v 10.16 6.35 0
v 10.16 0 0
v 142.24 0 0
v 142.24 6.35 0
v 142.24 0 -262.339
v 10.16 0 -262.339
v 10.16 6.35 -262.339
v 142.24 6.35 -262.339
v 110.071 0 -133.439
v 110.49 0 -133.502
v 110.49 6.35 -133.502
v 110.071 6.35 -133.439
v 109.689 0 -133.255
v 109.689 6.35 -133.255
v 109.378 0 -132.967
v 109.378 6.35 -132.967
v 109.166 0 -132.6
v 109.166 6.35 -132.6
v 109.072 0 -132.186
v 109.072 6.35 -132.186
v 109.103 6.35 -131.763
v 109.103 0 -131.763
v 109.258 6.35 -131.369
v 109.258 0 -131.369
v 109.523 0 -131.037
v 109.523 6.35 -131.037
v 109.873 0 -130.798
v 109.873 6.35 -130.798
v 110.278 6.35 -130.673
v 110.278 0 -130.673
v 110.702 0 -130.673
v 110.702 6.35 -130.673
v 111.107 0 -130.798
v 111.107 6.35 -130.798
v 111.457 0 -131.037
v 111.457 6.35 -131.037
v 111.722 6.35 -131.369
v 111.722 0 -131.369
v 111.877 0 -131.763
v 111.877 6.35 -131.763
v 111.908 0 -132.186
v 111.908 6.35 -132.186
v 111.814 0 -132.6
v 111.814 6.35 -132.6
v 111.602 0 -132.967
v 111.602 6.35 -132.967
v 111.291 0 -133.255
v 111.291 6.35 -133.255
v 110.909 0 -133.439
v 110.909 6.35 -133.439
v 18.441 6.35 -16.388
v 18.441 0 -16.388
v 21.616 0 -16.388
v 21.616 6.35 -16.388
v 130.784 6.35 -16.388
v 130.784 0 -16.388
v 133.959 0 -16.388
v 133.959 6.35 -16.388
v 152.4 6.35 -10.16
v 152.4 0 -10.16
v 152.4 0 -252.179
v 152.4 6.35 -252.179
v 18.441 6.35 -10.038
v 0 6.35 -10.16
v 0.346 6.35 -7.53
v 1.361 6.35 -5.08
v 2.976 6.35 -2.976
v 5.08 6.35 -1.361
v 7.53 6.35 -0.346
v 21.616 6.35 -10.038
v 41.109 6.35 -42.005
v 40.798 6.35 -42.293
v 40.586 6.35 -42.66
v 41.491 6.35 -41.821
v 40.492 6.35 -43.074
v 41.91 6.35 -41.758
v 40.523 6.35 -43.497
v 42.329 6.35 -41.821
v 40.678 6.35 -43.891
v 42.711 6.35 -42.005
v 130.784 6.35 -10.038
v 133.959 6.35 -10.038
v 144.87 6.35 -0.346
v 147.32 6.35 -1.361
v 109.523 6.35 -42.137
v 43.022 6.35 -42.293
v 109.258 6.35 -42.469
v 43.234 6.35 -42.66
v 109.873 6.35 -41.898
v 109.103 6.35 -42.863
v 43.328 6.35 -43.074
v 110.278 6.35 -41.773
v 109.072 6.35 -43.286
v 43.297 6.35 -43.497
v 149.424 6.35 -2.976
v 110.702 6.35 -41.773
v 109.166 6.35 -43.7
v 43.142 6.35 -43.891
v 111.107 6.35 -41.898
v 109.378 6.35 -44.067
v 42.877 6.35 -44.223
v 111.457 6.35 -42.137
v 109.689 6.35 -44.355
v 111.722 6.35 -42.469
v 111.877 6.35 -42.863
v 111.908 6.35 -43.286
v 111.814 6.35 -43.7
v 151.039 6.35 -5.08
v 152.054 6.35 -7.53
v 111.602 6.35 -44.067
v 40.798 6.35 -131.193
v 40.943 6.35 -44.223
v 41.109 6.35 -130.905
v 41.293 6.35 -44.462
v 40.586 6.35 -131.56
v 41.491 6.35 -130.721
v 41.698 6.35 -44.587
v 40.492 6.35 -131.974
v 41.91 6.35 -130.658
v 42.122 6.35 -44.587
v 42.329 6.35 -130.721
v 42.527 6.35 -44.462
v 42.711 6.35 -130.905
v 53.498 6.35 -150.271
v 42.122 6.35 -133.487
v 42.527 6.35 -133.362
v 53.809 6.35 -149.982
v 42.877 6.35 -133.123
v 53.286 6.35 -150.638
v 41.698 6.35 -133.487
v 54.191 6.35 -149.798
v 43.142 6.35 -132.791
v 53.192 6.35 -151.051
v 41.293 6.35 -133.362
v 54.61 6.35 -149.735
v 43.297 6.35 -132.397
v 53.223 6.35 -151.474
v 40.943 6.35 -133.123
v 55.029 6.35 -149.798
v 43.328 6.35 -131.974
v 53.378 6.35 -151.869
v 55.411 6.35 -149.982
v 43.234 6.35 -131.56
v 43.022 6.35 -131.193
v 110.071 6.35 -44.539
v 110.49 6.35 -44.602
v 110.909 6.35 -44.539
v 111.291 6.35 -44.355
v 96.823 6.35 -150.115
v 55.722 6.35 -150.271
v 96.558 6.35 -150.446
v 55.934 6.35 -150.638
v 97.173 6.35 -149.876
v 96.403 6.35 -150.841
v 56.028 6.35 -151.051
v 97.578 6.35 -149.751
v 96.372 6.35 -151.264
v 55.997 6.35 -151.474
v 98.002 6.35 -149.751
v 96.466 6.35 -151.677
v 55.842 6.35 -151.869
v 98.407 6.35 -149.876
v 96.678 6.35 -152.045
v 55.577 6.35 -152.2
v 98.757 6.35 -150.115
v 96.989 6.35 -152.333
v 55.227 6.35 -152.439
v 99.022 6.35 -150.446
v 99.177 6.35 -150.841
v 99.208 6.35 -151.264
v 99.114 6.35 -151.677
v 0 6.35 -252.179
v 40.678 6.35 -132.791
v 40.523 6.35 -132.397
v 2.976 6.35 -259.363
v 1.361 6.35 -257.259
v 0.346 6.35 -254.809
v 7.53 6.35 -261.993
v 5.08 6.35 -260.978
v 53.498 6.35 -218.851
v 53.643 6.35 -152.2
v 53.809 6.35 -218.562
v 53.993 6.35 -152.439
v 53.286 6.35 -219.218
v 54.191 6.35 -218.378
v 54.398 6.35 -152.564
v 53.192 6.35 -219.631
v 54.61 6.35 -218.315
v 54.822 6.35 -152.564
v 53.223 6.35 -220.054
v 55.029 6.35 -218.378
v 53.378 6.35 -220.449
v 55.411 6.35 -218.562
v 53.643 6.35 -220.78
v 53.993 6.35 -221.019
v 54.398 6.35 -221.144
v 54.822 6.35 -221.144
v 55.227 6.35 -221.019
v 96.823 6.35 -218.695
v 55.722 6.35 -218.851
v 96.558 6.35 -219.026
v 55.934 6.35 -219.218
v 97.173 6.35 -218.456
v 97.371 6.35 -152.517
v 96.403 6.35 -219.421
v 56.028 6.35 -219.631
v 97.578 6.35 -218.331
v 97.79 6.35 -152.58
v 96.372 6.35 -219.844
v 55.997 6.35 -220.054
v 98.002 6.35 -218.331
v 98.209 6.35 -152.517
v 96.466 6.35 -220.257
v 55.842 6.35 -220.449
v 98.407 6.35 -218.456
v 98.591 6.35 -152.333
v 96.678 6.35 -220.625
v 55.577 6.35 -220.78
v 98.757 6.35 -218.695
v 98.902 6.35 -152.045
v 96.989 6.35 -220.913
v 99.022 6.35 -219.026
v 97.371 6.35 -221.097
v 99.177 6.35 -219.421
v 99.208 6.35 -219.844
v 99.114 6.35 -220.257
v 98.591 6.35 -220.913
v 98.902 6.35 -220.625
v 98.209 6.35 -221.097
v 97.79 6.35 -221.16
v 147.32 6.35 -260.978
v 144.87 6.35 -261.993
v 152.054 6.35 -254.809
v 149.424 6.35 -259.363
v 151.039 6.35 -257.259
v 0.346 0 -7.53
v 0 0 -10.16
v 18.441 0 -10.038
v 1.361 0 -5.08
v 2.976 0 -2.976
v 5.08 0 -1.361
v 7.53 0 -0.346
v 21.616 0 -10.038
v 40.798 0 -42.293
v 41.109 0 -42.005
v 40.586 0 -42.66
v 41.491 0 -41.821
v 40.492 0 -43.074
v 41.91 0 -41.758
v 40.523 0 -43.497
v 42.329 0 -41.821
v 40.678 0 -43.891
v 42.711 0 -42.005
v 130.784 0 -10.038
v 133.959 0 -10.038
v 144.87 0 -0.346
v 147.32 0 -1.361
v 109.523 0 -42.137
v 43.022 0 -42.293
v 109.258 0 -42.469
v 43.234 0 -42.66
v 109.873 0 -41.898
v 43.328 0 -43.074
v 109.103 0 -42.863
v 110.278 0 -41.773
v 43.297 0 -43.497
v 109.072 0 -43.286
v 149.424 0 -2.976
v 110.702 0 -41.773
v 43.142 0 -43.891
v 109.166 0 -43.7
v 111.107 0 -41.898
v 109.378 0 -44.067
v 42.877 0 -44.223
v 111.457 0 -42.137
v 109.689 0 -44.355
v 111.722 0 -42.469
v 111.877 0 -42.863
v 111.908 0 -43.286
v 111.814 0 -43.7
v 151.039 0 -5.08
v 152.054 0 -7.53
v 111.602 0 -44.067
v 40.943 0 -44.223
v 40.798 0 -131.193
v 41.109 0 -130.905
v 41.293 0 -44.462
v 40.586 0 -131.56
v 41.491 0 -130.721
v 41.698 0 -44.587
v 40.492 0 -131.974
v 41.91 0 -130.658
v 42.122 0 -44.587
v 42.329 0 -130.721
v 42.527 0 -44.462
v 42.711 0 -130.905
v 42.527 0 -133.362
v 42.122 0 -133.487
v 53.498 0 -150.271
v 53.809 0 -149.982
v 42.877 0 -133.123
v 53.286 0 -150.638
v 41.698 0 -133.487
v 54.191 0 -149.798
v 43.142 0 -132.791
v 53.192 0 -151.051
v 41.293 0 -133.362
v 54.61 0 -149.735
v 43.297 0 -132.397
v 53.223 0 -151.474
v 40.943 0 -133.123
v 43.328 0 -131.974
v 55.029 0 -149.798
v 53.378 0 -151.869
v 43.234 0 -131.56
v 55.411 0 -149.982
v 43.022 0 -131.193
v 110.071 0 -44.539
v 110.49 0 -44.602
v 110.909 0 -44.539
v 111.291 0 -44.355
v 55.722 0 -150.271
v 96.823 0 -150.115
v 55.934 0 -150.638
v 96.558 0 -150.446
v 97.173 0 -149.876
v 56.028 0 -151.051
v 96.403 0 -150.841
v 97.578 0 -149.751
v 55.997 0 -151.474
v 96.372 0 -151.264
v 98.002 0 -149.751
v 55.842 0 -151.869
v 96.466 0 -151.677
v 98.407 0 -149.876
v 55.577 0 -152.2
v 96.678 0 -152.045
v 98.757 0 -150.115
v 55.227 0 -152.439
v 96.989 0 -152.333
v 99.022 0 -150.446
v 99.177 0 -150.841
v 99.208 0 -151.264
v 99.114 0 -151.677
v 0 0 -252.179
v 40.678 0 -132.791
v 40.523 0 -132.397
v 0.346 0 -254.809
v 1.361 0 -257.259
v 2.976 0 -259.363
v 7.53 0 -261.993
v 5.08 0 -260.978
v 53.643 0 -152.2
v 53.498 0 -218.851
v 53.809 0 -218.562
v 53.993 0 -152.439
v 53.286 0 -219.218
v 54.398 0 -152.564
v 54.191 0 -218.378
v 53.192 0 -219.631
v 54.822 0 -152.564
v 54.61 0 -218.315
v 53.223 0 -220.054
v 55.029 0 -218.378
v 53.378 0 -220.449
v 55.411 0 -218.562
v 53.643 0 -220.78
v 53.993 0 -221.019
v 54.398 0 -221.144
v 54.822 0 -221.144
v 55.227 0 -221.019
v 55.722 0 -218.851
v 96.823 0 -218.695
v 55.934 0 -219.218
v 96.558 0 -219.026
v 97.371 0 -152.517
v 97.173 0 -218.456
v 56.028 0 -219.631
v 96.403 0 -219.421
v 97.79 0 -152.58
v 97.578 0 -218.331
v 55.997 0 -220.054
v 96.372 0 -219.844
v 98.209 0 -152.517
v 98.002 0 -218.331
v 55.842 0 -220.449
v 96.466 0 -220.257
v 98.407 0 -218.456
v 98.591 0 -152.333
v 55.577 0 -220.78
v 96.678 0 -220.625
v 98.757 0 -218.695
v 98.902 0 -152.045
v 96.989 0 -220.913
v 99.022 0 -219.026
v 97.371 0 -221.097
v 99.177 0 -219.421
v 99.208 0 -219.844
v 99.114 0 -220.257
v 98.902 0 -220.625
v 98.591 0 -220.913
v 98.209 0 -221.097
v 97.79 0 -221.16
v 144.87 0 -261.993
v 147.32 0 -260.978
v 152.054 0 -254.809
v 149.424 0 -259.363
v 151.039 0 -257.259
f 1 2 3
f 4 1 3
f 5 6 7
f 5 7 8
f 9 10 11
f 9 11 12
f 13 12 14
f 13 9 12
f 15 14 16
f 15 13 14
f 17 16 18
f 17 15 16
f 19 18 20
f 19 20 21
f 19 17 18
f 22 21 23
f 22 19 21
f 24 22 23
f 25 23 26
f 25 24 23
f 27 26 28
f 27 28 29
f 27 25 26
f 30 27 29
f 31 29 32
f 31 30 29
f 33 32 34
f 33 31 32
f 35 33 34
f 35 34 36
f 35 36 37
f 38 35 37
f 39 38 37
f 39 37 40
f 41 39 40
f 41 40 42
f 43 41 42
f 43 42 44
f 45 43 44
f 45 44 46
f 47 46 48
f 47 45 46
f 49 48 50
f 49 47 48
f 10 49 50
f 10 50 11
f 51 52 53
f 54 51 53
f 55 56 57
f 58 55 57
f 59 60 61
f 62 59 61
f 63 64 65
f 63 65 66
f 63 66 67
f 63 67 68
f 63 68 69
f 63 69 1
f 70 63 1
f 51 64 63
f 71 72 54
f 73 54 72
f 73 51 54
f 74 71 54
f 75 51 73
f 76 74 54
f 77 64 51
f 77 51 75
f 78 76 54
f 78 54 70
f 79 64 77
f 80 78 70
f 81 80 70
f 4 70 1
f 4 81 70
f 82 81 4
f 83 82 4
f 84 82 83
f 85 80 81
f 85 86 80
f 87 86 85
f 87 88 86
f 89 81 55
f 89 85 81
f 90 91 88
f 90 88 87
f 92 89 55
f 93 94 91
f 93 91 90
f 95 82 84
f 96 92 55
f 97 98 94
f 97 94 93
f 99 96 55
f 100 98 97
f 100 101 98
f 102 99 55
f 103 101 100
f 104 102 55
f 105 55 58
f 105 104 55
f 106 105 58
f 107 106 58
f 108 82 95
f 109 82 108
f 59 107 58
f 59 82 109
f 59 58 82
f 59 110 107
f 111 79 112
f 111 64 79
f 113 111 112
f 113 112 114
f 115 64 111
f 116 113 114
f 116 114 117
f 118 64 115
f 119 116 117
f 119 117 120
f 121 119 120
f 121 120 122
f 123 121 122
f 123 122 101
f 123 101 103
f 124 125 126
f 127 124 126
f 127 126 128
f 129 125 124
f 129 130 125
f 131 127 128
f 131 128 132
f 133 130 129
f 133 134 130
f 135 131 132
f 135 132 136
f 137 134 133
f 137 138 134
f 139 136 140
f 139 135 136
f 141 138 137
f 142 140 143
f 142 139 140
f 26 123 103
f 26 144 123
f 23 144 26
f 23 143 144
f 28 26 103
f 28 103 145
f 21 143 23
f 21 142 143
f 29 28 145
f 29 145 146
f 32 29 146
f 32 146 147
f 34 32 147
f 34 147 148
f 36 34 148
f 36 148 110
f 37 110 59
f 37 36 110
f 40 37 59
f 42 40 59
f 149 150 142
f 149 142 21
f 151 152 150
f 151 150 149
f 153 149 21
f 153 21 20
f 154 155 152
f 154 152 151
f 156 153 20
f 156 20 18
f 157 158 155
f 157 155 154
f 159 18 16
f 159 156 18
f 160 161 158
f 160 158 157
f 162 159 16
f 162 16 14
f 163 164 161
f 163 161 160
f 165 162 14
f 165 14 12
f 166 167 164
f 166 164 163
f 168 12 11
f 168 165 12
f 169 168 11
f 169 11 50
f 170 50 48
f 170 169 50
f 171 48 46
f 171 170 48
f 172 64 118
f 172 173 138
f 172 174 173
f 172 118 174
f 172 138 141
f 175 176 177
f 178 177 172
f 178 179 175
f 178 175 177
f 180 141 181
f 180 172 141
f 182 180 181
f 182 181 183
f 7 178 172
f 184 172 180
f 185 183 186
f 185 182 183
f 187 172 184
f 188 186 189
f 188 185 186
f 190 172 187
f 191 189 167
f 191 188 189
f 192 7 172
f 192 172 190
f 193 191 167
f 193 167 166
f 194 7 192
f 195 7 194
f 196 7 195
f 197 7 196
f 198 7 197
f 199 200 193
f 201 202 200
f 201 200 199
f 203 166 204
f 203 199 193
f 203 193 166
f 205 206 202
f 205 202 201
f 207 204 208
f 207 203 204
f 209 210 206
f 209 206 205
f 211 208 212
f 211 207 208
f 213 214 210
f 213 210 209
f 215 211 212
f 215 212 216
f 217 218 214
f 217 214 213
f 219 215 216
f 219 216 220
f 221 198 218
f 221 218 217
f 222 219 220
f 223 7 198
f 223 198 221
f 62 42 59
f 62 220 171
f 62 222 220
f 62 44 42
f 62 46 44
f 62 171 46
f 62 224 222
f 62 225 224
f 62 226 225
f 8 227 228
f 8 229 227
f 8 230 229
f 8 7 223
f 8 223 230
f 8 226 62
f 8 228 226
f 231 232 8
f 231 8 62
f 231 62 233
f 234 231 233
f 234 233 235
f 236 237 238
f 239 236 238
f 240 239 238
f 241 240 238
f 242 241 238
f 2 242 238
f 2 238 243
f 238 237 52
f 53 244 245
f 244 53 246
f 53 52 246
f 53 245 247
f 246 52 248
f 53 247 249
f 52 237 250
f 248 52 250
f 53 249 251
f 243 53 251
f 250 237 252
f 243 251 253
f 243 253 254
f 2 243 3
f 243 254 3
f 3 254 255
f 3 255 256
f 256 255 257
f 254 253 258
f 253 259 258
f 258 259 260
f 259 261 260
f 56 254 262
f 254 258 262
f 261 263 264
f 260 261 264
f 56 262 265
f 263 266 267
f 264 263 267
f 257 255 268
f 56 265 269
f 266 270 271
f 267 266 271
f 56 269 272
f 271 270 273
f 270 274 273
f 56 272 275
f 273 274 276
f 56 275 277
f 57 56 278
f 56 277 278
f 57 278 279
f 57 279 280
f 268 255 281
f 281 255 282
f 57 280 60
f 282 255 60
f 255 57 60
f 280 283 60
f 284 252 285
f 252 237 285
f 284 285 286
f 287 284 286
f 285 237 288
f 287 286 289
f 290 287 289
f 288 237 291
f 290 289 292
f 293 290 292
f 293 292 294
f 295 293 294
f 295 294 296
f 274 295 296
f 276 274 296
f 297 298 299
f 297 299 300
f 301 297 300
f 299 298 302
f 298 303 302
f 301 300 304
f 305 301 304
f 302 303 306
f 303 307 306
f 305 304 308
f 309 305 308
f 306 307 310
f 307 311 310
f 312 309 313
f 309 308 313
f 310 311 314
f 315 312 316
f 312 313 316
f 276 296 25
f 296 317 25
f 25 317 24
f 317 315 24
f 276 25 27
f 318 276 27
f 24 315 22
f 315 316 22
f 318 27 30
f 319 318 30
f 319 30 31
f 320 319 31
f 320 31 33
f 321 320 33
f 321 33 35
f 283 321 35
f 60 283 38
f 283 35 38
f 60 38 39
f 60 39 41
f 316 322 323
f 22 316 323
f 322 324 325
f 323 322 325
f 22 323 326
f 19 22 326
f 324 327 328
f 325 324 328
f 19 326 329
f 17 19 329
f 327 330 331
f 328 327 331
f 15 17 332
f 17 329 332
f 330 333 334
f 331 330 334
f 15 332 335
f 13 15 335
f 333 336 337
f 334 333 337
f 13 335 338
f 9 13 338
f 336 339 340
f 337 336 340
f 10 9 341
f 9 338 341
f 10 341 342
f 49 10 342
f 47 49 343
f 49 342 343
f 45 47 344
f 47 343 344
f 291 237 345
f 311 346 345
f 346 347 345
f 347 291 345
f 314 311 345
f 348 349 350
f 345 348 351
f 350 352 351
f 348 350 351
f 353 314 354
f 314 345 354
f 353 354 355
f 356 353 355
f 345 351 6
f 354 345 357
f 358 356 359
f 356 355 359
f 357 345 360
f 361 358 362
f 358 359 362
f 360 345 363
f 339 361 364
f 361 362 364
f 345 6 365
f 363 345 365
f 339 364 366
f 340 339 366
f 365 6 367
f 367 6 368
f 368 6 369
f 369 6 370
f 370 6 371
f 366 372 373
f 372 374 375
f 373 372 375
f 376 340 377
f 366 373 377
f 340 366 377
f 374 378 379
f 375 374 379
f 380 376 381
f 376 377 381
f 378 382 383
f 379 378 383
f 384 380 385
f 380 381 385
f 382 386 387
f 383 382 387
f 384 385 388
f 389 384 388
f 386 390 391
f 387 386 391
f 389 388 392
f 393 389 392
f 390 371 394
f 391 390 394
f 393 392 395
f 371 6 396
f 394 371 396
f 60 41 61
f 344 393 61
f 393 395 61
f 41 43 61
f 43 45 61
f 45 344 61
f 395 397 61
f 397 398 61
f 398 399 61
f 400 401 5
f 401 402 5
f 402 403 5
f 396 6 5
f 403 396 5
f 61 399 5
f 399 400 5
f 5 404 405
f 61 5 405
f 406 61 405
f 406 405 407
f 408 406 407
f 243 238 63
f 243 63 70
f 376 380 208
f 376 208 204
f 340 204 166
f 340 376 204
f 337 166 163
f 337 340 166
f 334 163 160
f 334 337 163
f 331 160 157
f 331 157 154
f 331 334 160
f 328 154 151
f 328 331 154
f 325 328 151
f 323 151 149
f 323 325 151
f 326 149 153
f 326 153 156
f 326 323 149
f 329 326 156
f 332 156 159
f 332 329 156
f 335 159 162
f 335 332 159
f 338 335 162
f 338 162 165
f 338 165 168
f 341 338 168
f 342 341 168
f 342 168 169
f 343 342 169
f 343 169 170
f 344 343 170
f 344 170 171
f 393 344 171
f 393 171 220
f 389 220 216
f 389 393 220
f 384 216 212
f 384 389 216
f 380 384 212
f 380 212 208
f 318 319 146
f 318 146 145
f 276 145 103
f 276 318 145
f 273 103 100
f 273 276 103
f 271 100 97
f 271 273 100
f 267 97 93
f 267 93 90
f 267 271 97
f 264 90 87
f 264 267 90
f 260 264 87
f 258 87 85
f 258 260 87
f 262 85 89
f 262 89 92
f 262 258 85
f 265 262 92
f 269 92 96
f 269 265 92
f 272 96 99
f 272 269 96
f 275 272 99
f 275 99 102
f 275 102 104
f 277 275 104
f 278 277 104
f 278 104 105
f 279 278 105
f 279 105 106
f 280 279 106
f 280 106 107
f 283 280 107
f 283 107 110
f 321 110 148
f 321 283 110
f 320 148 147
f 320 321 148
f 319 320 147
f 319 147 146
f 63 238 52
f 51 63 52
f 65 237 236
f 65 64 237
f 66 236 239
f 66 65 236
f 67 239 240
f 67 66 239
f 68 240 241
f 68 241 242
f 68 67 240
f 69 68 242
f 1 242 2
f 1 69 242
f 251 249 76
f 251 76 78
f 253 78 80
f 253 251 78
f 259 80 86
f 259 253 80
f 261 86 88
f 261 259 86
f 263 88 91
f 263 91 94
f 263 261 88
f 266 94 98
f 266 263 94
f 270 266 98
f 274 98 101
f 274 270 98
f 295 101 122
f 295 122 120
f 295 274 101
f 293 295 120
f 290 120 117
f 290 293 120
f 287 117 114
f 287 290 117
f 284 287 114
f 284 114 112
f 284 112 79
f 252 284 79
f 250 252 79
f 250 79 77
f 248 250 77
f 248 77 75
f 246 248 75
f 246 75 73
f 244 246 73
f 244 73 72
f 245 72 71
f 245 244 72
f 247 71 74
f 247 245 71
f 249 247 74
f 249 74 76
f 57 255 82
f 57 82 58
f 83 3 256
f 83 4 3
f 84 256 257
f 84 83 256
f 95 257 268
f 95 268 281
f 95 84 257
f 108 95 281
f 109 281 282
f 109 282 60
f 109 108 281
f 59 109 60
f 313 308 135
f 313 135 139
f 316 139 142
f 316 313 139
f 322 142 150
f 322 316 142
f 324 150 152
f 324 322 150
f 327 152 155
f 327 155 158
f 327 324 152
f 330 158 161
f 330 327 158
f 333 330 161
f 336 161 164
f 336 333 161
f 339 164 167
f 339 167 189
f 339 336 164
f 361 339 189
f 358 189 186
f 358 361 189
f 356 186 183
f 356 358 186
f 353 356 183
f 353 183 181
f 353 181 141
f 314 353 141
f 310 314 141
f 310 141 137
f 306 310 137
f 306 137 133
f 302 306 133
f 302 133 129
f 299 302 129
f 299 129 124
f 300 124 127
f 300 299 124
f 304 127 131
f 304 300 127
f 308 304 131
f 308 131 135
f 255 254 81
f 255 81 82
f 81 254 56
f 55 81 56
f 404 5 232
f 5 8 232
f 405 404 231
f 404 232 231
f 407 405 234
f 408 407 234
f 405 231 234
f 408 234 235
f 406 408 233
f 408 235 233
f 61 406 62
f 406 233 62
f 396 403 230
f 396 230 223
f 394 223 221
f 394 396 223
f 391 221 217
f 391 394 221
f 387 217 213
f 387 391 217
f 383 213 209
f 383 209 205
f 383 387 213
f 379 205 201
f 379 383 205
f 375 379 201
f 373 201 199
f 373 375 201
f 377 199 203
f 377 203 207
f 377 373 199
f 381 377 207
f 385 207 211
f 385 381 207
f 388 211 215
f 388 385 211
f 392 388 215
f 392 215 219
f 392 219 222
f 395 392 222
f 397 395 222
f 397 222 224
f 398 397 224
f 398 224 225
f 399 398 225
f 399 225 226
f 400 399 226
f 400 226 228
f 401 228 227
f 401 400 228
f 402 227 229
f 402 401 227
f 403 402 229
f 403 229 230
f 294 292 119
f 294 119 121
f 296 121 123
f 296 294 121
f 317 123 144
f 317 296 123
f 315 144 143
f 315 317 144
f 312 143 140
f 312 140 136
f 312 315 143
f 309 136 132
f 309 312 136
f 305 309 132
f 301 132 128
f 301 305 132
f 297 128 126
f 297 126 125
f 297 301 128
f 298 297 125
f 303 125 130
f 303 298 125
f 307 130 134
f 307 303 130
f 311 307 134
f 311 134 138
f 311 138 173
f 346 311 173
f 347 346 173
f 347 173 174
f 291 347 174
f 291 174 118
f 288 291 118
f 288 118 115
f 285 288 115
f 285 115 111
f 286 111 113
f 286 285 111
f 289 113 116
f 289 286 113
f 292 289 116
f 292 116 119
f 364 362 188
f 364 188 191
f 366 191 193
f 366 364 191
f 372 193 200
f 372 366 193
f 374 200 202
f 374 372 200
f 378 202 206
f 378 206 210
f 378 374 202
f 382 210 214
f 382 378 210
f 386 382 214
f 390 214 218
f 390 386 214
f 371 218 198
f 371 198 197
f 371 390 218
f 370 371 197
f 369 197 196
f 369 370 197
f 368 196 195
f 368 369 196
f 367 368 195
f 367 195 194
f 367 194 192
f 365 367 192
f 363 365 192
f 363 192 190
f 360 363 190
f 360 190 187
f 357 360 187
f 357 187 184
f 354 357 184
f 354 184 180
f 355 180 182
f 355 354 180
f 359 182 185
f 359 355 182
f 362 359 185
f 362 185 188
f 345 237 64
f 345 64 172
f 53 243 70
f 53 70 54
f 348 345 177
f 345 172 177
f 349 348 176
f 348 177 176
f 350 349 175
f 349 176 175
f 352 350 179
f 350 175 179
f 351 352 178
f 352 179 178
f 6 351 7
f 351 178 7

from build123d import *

# Parameters (mm, degrees)
SKETCH3_W           = 152.4
SKETCH3_H           = 262.339276313
SKETCH3_R           = 1.4224
SKETCH3_W_2         = 3.175
SKETCH3_H_2         = 6.35
BOSS_EXTRUDE1_DEPTH = 6.35
FILLET1_R           = 10.16


with BuildPart() as part:
    # Sketch3 → Boss-Extrude1 (new body)
    with BuildSketch(Plane(origin=(0, 0, 0), x_dir=(1, 0, 0), z_dir=(0, 1, 0))):
        with Locations((76.2, 131.169638157)):
            Rectangle(SKETCH3_W, SKETCH3_H)
        with Locations(Location((41.91, 43.18, 0), (0, 0, 270))):
            Circle(SKETCH3_R, mode=Mode.SUBTRACT)
        with Locations(Location((41.91, 132.08, 0), (0, 0, 270))):
            Circle(SKETCH3_R, mode=Mode.SUBTRACT)
        with Locations(Location((110.49, 132.08, 0), (0, 0, 90))):
            Circle(SKETCH3_R, mode=Mode.SUBTRACT)
        with Locations(Location((110.49, 43.18, 0), (0, 0, 90))):
            Circle(SKETCH3_R, mode=Mode.SUBTRACT)
        with Locations(Location((54.61, 151.157668748, 0), (0, 0, 270))):
            Circle(SKETCH3_R, mode=Mode.SUBTRACT)
        with Locations(Location((54.61, 219.737668748, 0), (0, 0, 270))):
            Circle(SKETCH3_R, mode=Mode.SUBTRACT)
        with Locations(Location((97.79, 151.157668748, 0), (0, 0, 90))):
            Circle(SKETCH3_R, mode=Mode.SUBTRACT)
        with Locations(Location((97.79, 219.737668748, 0), (0, 0, 90))):
            Circle(SKETCH3_R, mode=Mode.SUBTRACT)
        with Locations((20.0285604, 13.212735966)):
            Rectangle(SKETCH3_W_2, SKETCH3_H_2, mode=Mode.SUBTRACT)
        with Locations((132.3714396, 13.212735966)):
            Rectangle(SKETCH3_W_2, SKETCH3_H_2, mode=Mode.SUBTRACT)
    extrude(amount=BOSS_EXTRUDE1_DEPTH)

    # Fillet1
    fillet1_edges = [part.edges().sort_by_distance(p)[0] for p in [
        (0, 3.175, -262.339276313),
        (152.4, 3.175, -262.339276313),
        (152.4, 3.175, 0),
        (0, 3.175, 0),
    ]]
    fillet(fillet1_edges, radius=FILLET1_R)


solid = part.part
